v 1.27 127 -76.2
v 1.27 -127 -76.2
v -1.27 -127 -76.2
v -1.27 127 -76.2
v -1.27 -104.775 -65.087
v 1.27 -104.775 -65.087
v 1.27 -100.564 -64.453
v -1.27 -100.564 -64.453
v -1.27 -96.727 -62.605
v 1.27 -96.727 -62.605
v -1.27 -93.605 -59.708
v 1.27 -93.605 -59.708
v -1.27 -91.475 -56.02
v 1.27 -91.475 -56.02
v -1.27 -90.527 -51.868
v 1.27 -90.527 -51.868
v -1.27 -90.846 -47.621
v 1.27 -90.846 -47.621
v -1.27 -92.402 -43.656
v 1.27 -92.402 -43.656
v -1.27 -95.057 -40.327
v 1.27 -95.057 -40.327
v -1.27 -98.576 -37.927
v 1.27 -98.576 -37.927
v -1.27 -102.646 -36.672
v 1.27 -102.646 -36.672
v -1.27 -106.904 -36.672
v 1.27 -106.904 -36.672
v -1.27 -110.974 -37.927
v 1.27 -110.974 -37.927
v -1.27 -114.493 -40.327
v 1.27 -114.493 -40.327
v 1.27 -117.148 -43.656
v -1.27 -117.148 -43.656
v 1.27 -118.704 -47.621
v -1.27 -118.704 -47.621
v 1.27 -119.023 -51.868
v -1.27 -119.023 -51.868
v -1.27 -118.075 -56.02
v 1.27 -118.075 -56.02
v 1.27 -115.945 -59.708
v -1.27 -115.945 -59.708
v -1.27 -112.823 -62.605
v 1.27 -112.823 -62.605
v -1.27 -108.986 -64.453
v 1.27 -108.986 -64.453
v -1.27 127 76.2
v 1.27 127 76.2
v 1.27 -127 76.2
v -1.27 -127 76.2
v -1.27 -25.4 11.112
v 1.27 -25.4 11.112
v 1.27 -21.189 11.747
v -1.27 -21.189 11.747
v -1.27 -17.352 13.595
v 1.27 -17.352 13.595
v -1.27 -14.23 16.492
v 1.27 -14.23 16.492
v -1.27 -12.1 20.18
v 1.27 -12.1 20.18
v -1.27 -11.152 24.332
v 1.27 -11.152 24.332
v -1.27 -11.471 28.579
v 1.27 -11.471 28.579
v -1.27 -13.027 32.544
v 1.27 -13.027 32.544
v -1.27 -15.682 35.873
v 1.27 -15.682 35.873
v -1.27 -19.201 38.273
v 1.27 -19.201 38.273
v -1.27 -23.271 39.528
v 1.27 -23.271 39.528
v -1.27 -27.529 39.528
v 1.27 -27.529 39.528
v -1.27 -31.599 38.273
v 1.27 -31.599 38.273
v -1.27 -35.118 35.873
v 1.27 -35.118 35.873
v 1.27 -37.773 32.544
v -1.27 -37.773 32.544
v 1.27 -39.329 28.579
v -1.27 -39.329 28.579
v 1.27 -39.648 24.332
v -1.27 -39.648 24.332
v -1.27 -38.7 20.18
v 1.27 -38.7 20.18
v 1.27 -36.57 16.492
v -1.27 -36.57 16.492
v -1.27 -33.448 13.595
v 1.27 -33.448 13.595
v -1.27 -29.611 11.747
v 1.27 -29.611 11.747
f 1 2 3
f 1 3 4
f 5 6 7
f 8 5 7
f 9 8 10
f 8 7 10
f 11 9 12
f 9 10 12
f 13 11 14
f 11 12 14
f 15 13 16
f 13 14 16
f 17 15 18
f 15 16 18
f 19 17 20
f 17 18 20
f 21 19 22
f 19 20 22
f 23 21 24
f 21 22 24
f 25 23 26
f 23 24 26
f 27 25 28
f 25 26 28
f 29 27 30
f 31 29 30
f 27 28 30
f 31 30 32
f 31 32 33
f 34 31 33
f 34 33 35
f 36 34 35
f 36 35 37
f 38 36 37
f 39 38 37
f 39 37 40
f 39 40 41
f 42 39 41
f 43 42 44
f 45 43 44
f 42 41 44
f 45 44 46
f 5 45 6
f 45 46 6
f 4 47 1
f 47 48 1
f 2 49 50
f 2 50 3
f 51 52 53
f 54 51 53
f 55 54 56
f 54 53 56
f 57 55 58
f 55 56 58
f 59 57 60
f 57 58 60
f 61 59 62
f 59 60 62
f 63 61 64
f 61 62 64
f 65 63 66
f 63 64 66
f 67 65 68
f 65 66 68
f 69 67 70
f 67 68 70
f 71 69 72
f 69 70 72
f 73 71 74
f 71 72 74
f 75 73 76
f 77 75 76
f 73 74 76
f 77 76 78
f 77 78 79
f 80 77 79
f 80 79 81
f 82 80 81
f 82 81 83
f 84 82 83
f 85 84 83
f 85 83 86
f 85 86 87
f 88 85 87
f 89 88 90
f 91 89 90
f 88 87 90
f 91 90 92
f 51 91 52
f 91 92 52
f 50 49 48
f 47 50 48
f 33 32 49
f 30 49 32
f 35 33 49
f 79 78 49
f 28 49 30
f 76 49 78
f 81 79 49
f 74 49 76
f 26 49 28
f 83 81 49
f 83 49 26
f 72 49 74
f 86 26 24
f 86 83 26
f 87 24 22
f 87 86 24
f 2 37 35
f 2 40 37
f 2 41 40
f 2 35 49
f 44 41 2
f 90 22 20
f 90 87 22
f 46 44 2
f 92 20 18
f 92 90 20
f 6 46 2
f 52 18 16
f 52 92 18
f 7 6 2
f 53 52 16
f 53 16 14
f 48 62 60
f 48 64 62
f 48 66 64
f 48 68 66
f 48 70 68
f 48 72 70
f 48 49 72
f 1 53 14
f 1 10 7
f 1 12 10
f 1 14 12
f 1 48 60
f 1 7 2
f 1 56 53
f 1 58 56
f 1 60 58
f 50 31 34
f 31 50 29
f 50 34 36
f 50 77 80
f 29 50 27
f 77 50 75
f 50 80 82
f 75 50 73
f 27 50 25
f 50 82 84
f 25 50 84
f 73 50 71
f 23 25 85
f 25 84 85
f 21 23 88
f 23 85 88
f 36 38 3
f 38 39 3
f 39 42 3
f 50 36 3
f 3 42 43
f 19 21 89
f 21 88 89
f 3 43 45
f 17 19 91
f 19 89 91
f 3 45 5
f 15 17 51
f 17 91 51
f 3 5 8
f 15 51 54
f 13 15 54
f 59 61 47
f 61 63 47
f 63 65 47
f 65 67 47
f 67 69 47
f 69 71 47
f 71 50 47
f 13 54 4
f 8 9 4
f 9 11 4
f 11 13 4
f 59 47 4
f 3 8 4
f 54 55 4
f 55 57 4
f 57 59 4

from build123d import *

# Parameters (mm, degrees)
SKETCH1_W                       = 152.4
SKETCH1_H                       = 254
BOSS_EXTRUDE1_DEPTH             = 1.27
SKETCH2_R                       = 14.2875
UPPER_INTAKE_BEARING_HOLE_DEPTH = 2.54
SKETCH3_R                       = 14.2875
LOWER_INTAKE_BEARING_HOLE_DEPTH = 2.54


with BuildPart() as part:
    # Sketch1 → Boss-Extrude1 (new, symmetric)
    with BuildSketch(Plane(origin=(0, 0, 0), x_dir=(0, 0, -1), z_dir=(1, 0, 0))):
        Rectangle(SKETCH1_W, SKETCH1_H)
    extrude(amount=BOSS_EXTRUDE1_DEPTH, both=True)

    # Sketch2 → upper intake bearing hole (cut)
    with BuildSketch(Plane(origin=(1.27, 0, 0), x_dir=(0, 0, -1), z_dir=(1, 0, 0))):
        with Locations((-25.4, -25.4)):
            Circle(SKETCH2_R)
    extrude(amount=-UPPER_INTAKE_BEARING_HOLE_DEPTH, mode=Mode.SUBTRACT)

    # Sketch3 → lower intake bearing hole (cut)
    with BuildSketch(Plane(origin=(1.27, 0, 0), x_dir=(0, 0, -1), z_dir=(1, 0, 0))):
        with Locations((50.8, -104.775)):
            Circle(SKETCH3_R)
    extrude(amount=-LOWER_INTAKE_BEARING_HOLE_DEPTH, mode=Mode.SUBTRACT)


solid = part.part
